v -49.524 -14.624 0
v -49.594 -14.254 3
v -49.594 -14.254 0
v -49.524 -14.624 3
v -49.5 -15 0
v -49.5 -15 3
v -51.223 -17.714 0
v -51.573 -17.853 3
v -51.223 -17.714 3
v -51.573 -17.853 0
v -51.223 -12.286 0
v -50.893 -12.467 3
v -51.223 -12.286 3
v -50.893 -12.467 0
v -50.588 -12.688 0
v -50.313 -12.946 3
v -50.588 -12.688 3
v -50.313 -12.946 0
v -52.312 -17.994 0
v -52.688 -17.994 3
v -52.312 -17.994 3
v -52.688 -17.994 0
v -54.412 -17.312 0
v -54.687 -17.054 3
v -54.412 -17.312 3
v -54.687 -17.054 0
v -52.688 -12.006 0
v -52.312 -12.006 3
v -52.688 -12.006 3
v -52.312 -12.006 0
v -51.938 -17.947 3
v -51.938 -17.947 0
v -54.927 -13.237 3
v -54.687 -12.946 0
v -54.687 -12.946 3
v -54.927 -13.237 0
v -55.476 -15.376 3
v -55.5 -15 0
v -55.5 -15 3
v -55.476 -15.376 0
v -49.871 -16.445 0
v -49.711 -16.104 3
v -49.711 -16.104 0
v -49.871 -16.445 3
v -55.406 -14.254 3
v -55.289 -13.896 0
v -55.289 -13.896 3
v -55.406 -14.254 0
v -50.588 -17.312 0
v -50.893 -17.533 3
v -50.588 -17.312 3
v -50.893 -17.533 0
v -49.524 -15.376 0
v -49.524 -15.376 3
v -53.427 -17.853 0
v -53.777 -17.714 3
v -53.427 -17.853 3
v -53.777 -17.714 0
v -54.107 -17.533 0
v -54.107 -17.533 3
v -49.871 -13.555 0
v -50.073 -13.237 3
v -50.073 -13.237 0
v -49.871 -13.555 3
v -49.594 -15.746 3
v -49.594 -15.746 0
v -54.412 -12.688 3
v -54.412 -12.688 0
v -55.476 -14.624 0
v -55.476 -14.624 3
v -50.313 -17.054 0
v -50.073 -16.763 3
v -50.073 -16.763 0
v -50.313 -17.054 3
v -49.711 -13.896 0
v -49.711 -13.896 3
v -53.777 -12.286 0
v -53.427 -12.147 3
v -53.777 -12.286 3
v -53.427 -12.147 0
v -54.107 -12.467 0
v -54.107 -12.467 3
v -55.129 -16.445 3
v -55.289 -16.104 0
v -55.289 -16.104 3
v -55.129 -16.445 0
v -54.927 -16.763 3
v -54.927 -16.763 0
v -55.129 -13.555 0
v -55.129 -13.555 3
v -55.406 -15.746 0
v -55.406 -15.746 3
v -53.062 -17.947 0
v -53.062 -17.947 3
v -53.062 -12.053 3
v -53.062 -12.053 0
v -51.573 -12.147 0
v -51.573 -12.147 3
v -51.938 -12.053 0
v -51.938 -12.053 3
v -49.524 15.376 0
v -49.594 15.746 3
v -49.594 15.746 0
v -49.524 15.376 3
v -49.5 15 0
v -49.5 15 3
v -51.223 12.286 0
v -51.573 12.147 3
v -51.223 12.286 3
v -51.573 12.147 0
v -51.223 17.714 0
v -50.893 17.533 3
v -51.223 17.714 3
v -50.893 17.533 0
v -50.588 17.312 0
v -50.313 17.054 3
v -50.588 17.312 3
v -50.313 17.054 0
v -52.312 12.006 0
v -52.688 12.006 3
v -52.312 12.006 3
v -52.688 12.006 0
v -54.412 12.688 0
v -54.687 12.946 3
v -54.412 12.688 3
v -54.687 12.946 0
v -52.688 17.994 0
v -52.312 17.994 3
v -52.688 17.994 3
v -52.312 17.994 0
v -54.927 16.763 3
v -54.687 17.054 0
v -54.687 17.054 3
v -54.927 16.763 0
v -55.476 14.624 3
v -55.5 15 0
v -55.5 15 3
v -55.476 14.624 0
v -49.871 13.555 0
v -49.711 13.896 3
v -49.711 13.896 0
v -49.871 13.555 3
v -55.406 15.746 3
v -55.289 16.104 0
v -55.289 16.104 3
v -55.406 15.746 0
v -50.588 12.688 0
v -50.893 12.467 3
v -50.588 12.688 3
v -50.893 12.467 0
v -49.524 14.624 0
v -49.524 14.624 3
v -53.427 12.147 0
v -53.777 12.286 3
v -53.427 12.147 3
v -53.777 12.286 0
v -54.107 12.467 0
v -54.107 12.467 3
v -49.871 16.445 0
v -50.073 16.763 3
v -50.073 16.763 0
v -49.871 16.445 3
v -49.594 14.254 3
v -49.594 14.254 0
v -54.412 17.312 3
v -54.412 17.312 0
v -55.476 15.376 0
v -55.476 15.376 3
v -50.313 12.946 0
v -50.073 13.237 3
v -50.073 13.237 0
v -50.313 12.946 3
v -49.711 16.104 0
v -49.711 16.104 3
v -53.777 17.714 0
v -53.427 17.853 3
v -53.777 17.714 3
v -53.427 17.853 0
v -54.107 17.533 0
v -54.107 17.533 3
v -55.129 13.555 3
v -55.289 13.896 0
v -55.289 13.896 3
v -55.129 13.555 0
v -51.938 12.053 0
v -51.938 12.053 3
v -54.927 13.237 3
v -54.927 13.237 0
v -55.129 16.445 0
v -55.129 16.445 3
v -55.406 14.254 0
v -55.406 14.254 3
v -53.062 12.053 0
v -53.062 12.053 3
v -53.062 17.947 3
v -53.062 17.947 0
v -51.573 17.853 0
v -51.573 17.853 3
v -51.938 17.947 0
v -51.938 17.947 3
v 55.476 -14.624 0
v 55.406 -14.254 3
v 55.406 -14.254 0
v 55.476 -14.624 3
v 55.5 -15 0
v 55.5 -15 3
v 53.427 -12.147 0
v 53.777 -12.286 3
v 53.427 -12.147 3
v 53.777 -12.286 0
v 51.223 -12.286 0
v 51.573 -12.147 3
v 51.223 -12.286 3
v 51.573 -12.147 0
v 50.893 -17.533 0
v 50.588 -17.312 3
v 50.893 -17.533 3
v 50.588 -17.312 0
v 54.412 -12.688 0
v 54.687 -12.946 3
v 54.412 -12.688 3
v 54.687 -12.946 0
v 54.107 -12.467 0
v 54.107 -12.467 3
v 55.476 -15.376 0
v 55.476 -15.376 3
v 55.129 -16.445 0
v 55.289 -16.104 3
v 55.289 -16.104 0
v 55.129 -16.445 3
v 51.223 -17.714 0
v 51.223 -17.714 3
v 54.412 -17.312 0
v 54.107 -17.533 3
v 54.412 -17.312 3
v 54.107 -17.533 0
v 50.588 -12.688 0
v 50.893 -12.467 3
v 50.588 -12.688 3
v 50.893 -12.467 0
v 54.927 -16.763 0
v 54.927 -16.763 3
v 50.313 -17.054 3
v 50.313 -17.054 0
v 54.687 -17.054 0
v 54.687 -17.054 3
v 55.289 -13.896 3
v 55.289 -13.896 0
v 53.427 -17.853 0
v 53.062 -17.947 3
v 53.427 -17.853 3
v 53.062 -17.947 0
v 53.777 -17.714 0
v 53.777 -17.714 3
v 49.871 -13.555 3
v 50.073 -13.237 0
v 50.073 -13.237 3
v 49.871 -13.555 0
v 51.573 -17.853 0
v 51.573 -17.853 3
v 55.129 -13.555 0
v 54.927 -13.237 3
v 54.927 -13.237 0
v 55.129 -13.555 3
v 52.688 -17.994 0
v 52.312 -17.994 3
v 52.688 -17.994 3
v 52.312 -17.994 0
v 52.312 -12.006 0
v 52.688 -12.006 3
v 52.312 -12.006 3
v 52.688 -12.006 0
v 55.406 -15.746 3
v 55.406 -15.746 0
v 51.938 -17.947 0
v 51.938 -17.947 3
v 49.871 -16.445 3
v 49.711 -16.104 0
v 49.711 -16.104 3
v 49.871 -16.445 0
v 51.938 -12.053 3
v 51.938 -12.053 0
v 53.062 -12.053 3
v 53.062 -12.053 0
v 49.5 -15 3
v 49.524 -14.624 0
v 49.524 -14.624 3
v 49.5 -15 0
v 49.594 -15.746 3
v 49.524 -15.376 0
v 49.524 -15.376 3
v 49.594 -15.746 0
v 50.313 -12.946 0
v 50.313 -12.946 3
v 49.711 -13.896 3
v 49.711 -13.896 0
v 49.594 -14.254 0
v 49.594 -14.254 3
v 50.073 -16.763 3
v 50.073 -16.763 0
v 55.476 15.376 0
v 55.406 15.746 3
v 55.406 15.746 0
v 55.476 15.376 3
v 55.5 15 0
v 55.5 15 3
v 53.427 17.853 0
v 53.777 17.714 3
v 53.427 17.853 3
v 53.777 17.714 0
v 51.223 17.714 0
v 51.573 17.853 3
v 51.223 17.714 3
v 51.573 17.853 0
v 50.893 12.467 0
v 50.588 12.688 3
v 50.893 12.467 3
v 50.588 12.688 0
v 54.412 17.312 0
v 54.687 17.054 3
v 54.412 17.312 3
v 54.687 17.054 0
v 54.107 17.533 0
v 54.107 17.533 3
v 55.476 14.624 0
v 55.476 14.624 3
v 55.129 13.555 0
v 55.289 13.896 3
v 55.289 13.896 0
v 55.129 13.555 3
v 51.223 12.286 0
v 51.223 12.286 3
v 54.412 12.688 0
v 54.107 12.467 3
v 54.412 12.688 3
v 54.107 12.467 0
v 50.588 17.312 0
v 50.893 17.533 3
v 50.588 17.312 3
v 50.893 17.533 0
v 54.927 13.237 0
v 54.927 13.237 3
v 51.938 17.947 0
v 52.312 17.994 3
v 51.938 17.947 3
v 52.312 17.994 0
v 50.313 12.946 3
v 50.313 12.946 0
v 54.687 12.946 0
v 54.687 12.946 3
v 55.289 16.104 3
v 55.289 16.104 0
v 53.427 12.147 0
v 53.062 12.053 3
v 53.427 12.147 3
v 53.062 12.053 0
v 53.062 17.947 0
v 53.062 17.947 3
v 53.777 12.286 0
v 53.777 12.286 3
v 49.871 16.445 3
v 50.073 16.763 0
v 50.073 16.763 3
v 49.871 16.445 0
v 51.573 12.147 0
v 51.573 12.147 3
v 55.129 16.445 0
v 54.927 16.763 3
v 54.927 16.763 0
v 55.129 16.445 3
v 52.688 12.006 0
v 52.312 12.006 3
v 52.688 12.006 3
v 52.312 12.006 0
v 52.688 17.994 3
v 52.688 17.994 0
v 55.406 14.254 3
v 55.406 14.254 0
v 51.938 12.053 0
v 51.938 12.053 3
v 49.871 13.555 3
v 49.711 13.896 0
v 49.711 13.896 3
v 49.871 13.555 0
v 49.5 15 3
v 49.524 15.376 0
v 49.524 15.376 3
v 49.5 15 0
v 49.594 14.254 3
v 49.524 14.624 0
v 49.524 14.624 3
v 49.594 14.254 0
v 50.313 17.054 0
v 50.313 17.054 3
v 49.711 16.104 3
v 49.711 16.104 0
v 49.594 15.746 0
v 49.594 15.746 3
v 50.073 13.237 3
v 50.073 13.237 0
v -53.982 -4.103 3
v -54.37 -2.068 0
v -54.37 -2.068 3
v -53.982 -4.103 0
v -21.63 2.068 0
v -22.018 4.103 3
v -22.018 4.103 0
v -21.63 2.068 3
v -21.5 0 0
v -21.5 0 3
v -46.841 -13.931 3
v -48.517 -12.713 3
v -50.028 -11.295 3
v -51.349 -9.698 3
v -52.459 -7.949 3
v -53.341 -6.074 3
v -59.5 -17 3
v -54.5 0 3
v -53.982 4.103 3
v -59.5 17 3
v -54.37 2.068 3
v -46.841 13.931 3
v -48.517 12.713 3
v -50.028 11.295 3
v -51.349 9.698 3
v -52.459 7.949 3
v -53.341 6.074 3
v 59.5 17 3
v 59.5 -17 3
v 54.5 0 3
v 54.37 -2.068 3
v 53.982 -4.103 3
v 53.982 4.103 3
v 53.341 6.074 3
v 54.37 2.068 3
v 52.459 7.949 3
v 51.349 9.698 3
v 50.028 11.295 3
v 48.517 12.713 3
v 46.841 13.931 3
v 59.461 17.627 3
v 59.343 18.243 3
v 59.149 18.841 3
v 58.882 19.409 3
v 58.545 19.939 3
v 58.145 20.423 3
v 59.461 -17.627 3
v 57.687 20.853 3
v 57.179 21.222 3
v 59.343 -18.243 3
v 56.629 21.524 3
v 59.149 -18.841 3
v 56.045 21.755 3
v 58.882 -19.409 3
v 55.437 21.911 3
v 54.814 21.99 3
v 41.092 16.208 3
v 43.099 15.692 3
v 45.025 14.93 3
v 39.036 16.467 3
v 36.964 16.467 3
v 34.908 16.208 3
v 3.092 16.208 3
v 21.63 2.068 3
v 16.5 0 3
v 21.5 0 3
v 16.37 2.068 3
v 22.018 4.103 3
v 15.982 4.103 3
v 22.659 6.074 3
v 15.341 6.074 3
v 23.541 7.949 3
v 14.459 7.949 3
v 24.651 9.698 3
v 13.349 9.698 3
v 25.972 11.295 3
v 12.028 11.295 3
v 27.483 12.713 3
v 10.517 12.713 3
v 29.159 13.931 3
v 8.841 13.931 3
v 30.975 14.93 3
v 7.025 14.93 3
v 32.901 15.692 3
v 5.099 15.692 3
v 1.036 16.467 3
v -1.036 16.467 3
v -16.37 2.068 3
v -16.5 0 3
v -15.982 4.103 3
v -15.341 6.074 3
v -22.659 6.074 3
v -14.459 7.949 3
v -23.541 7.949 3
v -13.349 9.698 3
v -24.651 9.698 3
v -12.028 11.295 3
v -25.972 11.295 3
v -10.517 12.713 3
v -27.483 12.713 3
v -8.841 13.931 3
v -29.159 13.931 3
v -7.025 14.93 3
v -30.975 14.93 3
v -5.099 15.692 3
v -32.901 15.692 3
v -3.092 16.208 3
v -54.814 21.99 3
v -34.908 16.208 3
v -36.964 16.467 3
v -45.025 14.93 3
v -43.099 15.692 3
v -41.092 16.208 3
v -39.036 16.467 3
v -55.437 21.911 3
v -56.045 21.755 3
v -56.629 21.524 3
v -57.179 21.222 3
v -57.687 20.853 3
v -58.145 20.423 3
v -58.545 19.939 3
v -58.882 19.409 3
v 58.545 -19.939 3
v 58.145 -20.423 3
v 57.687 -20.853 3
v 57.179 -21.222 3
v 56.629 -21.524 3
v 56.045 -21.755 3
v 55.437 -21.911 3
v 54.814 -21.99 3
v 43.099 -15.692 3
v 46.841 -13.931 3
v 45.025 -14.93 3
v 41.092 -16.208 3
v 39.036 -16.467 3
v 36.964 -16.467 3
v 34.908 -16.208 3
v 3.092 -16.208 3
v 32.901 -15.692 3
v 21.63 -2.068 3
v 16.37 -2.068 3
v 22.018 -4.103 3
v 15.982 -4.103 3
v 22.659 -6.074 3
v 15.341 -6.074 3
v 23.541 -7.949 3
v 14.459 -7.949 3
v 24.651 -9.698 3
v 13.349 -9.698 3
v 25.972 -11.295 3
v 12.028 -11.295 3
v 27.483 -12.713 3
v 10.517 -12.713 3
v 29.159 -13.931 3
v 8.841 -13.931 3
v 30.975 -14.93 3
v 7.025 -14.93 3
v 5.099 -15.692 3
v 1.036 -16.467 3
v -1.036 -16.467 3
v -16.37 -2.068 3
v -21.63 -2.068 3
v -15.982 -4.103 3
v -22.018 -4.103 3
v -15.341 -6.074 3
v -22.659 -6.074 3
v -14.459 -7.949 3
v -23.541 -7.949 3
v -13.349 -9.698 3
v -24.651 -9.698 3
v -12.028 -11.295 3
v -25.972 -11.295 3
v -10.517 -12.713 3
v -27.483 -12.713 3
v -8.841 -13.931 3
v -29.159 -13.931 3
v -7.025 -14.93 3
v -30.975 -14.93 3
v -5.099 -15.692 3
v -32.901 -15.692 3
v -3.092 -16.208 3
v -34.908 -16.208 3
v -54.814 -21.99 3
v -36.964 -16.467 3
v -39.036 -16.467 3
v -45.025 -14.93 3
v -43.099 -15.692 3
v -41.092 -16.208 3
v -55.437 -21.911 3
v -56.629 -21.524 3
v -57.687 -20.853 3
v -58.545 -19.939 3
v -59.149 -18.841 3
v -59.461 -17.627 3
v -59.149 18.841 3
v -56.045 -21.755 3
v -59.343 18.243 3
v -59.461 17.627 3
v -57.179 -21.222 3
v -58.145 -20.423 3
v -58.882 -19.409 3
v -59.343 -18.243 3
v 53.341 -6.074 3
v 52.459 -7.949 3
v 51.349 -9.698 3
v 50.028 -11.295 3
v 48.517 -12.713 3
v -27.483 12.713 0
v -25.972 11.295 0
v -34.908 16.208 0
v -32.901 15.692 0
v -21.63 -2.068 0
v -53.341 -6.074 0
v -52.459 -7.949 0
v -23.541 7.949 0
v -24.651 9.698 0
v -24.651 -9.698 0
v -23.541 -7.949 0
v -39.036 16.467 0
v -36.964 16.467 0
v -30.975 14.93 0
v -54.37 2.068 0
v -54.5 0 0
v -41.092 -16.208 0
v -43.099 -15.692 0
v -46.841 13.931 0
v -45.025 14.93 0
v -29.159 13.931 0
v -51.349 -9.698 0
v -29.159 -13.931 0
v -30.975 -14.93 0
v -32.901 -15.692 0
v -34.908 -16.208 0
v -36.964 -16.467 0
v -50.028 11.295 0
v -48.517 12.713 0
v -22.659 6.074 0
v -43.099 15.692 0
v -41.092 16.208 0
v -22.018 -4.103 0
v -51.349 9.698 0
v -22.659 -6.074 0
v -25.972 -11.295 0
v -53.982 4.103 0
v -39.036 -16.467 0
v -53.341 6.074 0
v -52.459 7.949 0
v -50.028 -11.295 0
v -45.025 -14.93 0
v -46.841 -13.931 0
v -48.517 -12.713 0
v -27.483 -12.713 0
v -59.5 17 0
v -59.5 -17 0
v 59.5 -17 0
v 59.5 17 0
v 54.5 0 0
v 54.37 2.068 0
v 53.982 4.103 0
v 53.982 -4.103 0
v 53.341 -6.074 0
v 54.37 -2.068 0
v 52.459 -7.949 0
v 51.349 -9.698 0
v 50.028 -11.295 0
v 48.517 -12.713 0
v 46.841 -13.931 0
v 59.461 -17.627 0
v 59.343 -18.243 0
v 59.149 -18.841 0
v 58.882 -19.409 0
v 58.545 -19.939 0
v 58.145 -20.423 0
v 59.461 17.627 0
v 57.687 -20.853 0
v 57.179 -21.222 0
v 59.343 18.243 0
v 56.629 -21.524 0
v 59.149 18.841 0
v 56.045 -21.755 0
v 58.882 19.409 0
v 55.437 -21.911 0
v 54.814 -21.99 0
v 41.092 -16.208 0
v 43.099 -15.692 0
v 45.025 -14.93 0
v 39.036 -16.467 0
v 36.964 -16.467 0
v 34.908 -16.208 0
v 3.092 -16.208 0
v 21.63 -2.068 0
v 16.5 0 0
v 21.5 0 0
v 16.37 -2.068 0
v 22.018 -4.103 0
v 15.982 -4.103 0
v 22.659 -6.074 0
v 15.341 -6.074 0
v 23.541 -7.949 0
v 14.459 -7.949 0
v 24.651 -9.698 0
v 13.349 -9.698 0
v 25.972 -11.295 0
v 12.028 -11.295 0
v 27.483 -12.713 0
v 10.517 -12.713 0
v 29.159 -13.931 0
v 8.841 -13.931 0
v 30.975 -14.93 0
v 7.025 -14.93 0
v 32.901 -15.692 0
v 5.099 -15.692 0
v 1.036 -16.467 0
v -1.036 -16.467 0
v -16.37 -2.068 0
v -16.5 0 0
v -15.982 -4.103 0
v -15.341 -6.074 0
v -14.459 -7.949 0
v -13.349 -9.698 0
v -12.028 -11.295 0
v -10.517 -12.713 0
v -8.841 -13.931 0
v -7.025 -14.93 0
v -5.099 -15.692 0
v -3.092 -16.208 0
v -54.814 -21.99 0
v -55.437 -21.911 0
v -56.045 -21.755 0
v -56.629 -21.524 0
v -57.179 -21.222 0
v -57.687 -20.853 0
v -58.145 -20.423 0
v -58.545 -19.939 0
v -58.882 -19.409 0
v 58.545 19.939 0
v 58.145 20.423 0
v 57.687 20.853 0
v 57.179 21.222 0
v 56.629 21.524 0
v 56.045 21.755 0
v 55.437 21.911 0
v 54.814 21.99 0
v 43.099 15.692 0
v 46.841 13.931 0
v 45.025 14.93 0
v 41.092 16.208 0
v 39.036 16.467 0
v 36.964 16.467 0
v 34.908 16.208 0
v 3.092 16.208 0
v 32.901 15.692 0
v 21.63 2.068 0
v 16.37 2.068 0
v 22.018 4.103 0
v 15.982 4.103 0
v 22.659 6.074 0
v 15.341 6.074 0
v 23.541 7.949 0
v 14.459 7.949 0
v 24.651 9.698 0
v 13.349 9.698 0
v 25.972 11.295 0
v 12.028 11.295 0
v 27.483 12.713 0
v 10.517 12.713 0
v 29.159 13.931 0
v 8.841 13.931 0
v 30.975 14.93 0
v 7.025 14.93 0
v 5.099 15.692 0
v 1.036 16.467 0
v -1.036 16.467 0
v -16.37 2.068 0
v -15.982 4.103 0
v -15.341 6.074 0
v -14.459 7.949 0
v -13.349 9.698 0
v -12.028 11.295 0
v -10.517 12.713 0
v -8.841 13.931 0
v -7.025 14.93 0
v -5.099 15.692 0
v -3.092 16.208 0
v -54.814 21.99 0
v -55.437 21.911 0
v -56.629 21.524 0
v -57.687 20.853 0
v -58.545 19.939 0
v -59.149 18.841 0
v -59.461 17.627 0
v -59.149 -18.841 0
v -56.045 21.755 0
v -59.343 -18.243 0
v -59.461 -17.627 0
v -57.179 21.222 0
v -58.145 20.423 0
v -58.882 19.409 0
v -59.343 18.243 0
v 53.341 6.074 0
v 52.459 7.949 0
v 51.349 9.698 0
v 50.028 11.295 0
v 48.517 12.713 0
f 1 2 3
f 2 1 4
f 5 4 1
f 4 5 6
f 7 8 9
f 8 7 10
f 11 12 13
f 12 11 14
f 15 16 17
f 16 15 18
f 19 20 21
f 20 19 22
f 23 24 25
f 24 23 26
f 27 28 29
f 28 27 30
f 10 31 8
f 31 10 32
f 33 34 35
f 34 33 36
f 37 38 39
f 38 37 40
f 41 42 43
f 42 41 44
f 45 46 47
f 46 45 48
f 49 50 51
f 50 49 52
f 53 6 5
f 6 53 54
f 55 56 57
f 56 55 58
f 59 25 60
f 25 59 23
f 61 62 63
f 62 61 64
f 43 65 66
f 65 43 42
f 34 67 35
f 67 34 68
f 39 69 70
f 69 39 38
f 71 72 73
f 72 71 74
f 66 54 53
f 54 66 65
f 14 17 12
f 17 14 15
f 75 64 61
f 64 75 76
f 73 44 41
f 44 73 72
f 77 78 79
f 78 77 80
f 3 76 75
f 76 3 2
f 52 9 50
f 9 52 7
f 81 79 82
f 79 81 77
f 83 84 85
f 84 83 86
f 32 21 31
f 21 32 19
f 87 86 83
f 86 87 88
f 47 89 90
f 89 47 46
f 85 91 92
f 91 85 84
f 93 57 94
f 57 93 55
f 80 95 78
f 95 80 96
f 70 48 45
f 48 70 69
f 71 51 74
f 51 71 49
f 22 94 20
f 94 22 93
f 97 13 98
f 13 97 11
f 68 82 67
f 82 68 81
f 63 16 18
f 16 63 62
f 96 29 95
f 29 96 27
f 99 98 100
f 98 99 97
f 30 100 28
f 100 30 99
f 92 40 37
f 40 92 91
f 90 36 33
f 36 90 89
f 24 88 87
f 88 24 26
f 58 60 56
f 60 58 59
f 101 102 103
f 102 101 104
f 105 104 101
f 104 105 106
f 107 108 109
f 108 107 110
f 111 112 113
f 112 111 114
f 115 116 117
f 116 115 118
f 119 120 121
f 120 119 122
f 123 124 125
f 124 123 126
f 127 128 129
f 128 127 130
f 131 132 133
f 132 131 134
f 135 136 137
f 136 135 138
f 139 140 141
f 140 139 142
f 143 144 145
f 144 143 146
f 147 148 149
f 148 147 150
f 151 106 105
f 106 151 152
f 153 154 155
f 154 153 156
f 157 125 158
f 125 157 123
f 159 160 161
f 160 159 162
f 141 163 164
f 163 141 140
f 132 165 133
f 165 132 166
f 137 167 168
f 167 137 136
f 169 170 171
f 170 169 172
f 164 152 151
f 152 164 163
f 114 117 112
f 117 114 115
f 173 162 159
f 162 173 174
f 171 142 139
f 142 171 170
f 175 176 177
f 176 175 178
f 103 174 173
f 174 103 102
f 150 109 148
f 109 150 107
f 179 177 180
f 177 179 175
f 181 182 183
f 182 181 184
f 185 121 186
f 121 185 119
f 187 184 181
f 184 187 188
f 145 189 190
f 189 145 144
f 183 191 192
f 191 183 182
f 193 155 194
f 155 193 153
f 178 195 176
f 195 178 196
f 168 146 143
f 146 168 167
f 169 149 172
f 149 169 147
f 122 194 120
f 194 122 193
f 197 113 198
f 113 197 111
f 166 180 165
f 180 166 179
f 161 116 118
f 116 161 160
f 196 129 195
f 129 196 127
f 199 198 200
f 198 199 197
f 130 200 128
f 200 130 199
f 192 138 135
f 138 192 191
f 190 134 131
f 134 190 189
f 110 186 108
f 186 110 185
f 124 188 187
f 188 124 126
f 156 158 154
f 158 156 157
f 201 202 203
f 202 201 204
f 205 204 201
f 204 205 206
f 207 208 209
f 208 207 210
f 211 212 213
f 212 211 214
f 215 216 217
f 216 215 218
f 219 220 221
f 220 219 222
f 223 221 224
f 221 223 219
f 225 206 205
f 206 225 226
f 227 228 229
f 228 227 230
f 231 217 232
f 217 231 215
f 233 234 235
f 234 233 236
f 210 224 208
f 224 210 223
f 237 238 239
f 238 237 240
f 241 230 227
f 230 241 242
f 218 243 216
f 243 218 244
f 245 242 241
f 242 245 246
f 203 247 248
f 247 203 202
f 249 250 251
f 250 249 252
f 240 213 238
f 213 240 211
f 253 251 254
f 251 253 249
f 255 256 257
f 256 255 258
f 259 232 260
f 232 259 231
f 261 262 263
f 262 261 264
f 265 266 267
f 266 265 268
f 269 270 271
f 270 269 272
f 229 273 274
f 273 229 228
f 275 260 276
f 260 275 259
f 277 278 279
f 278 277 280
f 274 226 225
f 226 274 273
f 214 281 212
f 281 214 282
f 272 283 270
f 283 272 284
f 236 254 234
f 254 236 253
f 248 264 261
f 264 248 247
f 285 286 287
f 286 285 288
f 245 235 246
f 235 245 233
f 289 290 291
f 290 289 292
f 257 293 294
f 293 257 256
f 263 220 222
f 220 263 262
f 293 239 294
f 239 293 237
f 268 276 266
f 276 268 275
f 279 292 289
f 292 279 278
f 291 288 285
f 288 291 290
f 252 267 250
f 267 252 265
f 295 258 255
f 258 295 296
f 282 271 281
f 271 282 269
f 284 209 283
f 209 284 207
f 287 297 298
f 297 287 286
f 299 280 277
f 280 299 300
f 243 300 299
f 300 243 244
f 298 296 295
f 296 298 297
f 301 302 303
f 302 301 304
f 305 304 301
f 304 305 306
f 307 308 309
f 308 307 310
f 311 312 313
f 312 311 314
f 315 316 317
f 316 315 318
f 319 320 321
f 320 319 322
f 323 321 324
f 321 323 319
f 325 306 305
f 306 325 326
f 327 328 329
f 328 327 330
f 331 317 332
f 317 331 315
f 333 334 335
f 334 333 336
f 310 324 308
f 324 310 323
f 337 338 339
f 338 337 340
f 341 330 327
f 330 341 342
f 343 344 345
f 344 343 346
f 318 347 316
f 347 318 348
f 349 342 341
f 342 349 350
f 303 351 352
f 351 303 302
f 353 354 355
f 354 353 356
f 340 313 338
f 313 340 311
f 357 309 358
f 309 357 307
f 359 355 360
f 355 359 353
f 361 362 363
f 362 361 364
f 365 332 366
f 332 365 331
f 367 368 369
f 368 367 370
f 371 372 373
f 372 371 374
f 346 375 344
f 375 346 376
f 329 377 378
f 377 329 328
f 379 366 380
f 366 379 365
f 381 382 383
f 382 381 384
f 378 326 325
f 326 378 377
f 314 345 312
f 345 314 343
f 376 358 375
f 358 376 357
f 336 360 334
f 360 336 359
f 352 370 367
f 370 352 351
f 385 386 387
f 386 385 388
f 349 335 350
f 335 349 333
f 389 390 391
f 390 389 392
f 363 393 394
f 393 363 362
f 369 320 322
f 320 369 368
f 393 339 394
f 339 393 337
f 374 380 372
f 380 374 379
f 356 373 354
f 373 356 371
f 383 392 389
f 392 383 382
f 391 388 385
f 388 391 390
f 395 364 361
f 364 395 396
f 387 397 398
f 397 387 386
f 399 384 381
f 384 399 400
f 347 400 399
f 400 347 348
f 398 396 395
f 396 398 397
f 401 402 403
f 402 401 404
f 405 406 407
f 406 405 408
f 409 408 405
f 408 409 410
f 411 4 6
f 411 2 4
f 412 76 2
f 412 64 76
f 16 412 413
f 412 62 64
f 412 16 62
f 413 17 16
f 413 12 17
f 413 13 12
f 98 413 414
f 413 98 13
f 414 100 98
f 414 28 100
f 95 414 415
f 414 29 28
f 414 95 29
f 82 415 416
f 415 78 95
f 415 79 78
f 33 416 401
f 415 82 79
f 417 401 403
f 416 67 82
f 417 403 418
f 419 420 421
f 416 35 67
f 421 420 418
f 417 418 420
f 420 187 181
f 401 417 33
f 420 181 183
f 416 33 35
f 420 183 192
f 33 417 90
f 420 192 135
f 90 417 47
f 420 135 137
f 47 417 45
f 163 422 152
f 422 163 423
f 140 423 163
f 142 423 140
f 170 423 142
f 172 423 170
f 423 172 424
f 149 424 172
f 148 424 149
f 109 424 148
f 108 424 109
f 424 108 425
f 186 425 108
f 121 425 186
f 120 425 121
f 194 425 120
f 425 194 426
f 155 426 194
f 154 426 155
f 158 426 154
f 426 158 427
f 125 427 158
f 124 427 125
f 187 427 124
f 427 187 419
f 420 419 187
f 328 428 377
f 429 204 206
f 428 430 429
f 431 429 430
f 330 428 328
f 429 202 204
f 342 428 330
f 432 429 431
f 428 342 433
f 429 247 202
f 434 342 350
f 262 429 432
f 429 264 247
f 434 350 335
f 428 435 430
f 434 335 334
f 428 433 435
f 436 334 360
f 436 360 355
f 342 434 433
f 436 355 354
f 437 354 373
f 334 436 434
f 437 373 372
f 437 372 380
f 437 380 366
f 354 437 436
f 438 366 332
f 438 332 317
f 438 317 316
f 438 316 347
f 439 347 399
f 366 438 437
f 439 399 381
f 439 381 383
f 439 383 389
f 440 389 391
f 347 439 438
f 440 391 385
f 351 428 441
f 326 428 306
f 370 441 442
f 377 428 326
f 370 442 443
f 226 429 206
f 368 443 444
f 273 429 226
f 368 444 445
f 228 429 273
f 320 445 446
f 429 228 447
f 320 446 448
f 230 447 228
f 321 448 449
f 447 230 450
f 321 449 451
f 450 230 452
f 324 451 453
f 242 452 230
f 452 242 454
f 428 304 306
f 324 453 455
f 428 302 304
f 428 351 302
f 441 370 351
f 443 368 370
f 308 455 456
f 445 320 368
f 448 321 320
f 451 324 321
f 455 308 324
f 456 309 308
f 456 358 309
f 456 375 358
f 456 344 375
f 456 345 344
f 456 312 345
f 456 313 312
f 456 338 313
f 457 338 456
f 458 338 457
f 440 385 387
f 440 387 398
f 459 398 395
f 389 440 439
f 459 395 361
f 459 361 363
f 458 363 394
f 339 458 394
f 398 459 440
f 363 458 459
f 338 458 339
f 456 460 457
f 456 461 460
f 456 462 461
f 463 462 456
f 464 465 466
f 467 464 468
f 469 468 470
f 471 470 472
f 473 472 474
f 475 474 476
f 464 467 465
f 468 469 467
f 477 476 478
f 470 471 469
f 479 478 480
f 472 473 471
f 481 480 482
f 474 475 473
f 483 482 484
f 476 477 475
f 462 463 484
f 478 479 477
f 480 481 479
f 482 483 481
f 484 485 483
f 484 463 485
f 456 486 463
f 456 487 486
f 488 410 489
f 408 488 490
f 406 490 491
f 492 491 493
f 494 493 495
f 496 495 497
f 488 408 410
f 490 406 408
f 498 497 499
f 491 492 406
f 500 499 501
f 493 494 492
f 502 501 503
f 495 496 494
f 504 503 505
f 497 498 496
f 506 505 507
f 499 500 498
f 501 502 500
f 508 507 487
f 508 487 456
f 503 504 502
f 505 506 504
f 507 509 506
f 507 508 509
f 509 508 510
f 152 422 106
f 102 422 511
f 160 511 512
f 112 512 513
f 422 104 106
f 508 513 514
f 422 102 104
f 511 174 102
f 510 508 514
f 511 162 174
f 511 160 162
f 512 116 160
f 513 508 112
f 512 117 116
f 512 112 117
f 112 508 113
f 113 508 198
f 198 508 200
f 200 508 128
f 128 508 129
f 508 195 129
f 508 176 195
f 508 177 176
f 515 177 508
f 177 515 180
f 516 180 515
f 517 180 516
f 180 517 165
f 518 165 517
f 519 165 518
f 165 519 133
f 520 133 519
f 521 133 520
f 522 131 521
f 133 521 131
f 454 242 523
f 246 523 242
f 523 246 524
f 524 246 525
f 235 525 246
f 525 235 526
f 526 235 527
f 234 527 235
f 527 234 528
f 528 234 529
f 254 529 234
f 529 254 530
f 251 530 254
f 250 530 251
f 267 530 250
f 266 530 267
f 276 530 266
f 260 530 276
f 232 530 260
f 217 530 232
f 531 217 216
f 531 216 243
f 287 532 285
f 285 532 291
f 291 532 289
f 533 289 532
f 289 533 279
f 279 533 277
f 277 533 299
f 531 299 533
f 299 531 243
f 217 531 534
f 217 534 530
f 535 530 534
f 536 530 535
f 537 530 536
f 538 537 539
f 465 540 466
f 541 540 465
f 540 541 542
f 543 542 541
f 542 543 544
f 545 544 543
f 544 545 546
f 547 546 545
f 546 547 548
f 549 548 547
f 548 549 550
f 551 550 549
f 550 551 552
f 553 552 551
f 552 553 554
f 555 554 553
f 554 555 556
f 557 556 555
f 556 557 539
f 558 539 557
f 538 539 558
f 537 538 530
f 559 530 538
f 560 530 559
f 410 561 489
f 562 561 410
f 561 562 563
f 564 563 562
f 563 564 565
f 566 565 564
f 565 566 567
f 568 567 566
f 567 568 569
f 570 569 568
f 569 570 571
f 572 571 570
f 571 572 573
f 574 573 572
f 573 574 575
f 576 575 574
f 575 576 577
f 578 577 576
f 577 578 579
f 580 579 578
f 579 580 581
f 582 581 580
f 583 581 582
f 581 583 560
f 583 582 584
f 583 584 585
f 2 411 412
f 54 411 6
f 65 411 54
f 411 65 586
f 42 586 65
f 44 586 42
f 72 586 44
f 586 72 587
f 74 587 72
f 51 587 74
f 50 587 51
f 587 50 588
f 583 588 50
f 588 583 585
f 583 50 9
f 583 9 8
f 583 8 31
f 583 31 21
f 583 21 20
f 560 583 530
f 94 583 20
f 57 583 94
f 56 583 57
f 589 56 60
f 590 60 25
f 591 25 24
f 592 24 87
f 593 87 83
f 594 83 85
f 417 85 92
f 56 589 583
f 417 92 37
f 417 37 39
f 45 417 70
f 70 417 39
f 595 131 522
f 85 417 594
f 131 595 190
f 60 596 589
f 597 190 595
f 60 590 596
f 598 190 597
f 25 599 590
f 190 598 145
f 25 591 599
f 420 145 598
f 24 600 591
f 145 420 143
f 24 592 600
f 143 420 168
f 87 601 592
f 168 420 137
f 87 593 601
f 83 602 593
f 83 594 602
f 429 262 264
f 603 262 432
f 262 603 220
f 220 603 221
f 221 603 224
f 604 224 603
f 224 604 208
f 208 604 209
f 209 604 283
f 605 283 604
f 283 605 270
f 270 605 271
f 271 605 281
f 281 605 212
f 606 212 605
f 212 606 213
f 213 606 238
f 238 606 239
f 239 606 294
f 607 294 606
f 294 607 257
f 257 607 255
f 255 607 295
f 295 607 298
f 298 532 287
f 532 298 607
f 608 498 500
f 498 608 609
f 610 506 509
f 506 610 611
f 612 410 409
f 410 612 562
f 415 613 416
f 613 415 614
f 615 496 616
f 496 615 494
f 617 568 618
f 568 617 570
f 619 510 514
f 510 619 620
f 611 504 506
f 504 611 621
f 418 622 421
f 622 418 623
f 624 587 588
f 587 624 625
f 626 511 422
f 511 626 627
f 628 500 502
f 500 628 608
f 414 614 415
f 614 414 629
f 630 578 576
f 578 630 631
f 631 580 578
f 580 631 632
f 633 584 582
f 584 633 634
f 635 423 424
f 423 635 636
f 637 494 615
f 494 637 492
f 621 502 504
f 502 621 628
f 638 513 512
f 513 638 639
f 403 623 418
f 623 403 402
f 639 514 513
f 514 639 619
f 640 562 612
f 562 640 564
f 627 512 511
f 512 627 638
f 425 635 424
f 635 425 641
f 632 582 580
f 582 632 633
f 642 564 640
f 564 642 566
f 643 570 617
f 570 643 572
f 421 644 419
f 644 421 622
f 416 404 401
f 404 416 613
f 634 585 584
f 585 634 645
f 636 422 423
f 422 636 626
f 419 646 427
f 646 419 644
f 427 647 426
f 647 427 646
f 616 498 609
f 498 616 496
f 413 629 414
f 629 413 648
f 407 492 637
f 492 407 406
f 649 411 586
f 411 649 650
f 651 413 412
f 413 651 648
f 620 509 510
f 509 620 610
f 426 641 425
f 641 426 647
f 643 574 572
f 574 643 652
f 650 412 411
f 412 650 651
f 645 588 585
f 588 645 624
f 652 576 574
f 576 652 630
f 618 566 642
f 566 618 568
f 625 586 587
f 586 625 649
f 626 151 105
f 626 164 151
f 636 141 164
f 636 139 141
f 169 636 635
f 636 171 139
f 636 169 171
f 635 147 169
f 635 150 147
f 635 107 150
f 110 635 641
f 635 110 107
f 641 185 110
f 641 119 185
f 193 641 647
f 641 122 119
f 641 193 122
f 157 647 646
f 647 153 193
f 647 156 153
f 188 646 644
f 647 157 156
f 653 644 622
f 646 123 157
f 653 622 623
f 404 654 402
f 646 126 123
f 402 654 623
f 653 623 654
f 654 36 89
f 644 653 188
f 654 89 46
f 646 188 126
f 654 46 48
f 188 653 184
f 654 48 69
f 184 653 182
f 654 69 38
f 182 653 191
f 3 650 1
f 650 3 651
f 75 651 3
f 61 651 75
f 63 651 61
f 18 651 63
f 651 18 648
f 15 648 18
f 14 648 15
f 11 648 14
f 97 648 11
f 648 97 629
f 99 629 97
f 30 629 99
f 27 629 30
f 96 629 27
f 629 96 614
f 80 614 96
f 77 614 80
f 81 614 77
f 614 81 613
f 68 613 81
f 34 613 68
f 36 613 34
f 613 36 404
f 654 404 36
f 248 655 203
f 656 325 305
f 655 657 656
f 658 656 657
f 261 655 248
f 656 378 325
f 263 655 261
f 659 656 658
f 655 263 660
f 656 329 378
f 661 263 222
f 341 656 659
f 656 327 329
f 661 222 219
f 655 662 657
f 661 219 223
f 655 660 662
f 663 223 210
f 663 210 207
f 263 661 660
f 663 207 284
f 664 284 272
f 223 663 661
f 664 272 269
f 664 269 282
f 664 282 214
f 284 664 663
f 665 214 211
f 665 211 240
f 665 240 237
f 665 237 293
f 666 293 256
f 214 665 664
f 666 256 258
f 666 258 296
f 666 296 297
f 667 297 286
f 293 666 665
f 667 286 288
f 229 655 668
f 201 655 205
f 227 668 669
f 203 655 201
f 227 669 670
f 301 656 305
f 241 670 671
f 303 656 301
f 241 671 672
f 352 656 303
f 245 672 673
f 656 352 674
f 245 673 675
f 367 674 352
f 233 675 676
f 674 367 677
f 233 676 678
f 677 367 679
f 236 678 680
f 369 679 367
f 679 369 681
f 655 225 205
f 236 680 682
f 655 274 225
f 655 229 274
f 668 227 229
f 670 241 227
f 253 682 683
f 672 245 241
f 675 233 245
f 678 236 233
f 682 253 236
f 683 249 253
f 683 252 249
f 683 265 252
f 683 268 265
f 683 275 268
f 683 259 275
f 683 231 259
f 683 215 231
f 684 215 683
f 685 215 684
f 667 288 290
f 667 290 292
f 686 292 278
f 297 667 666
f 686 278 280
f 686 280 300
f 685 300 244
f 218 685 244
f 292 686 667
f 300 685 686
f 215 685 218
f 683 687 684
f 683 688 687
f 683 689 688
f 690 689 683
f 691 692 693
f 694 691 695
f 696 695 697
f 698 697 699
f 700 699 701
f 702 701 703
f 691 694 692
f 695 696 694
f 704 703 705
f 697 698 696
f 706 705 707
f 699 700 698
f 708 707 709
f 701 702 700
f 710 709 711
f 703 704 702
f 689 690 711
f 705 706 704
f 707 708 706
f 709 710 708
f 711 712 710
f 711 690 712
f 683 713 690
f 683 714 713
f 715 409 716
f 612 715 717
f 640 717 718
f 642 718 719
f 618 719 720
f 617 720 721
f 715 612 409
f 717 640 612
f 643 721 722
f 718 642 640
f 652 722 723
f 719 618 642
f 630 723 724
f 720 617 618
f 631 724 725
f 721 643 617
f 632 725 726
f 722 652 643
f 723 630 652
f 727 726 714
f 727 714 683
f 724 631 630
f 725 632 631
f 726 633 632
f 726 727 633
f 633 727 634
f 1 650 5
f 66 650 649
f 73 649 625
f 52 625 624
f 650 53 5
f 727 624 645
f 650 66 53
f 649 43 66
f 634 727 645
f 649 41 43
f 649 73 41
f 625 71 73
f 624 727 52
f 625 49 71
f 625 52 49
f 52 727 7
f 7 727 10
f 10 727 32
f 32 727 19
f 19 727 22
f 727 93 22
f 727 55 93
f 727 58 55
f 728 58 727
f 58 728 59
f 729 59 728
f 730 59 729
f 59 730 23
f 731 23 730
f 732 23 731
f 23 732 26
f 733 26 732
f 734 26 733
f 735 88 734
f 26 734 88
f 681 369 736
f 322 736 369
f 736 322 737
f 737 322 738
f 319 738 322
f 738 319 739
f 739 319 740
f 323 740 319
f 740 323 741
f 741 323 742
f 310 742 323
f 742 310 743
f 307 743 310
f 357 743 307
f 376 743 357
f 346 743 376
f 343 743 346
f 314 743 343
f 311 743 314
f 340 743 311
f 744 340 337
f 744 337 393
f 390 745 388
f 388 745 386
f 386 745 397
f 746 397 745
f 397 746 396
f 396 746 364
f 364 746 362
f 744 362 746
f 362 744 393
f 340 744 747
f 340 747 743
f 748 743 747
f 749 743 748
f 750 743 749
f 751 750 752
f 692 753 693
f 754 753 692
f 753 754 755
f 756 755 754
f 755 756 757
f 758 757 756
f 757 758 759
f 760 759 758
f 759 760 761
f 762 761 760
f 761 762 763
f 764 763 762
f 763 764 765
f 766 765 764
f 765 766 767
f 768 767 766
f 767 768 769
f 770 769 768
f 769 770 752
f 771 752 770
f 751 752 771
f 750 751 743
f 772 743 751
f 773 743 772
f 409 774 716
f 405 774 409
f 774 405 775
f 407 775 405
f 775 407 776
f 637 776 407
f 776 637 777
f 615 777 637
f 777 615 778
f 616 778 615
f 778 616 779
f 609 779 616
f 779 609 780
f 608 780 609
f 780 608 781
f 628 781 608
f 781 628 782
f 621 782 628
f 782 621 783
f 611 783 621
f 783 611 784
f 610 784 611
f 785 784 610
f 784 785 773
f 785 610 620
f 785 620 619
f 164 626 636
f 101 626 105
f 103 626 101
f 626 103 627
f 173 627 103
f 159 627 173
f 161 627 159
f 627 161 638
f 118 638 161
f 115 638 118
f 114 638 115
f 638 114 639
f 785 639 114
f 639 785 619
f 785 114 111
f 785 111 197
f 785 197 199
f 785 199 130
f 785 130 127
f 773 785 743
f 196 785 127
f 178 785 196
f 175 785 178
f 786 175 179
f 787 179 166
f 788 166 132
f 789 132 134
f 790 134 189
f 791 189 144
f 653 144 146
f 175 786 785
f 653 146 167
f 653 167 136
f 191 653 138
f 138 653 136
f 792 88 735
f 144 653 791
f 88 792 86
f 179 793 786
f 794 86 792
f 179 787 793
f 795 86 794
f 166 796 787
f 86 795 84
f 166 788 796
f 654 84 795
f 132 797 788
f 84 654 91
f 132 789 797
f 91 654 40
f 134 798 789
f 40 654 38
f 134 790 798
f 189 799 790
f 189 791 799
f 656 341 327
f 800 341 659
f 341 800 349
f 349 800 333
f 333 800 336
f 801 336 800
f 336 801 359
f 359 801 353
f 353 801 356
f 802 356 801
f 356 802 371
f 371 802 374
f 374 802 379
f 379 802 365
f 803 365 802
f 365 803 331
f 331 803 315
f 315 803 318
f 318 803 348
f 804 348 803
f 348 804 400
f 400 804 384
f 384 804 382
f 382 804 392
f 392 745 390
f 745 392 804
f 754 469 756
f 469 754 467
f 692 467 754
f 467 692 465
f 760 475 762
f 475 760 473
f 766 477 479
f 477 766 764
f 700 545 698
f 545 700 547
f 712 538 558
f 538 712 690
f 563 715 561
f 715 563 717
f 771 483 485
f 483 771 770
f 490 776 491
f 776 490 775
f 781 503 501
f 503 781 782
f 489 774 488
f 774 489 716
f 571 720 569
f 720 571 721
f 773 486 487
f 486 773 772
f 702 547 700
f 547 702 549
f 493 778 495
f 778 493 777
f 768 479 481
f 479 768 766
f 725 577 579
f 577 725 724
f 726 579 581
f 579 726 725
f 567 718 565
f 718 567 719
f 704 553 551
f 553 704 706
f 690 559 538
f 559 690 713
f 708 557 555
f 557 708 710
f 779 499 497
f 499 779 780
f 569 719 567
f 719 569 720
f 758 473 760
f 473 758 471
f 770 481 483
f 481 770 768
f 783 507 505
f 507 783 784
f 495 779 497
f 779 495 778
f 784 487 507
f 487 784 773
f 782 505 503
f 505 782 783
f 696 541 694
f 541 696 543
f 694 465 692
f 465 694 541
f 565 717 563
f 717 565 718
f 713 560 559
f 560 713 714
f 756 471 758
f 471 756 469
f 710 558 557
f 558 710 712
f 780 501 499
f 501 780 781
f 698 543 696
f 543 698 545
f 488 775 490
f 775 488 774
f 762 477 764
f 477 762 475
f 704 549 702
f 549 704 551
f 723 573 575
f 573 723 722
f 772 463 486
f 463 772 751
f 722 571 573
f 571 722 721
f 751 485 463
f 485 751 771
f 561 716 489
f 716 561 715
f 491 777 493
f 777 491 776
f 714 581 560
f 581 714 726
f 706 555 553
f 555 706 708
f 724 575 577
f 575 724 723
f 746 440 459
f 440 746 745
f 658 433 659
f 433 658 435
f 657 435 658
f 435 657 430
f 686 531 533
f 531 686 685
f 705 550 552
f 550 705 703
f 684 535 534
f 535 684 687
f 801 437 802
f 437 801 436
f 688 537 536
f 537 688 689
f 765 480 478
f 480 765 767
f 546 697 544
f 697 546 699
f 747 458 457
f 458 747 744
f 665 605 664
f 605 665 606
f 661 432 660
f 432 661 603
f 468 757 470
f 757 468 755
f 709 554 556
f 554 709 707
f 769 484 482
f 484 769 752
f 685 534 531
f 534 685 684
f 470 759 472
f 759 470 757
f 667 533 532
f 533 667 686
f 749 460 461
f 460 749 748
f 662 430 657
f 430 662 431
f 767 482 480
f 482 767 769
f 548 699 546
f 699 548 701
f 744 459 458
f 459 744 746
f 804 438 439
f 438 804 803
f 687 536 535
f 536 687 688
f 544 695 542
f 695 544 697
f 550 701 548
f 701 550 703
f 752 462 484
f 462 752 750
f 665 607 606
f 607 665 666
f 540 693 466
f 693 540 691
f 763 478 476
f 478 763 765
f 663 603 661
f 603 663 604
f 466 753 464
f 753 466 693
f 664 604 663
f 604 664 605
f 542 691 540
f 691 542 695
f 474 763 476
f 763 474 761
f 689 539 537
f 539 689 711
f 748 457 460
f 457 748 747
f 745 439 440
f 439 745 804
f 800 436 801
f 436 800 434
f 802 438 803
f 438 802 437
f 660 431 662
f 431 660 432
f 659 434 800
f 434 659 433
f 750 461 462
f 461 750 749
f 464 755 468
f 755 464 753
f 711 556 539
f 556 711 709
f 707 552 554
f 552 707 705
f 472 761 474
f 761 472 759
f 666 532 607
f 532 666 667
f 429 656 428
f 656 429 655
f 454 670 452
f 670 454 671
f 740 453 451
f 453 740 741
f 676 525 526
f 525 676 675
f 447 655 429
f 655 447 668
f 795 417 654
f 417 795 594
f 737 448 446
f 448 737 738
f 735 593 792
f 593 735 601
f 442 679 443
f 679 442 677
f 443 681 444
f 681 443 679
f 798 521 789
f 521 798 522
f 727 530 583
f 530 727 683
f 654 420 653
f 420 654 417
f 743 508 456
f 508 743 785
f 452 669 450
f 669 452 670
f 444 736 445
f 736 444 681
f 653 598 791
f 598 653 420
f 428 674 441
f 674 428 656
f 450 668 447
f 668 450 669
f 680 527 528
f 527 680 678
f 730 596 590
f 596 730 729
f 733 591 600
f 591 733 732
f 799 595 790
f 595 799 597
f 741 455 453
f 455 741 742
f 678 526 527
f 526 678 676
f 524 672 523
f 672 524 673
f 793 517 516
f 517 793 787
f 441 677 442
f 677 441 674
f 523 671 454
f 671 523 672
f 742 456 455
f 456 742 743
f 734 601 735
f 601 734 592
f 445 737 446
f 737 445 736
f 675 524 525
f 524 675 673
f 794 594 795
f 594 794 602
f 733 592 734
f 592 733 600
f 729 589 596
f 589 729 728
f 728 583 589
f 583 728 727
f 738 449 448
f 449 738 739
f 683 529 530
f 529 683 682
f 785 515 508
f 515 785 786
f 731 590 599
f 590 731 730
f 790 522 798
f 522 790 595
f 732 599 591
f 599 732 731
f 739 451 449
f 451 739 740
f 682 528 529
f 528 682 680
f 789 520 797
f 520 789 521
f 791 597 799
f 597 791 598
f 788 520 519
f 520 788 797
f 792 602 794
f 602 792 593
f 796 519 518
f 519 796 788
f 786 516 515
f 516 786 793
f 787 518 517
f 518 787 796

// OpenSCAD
$fn = 50;


difference() {
	union() {
		hull() {
			translate(v = [-54.5000000000, 17.0000000000, 0]) {
				cylinder(h = 3, r = 5);
			}
			translate(v = [54.5000000000, 17.0000000000, 0]) {
				cylinder(h = 3, r = 5);
			}
			translate(v = [-54.5000000000, -17.0000000000, 0]) {
				cylinder(h = 3, r = 5);
			}
			translate(v = [54.5000000000, -17.0000000000, 0]) {
				cylinder(h = 3, r = 5);
			}
		}
	}
	union() {
		#translate(v = [-52.5000000000, -15.0000000000, -100.0000000000]) {
			cylinder(h = 200, r = 3.0000000000);
		}
		#translate(v = [-52.5000000000, 15.0000000000, -100.0000000000]) {
			cylinder(h = 200, r = 3.0000000000);
		}
		#translate(v = [52.5000000000, -15.0000000000, -100.0000000000]) {
			cylinder(h = 200, r = 3.0000000000);
		}
		#translate(v = [52.5000000000, 15.0000000000, -100.0000000000]) {
			cylinder(h = 200, r = 3.0000000000);
		}
		#translate(v = [-38.0000000000, 0, 0]) {
			cylinder(h = 3, r = 16.5000000000);
		}
		#cylinder(h = 3, r = 16.5000000000);
		#translate(v = [38.0000000000, 0, 0]) {
			cylinder(h = 3, r = 16.5000000000);
		}
	}
}
